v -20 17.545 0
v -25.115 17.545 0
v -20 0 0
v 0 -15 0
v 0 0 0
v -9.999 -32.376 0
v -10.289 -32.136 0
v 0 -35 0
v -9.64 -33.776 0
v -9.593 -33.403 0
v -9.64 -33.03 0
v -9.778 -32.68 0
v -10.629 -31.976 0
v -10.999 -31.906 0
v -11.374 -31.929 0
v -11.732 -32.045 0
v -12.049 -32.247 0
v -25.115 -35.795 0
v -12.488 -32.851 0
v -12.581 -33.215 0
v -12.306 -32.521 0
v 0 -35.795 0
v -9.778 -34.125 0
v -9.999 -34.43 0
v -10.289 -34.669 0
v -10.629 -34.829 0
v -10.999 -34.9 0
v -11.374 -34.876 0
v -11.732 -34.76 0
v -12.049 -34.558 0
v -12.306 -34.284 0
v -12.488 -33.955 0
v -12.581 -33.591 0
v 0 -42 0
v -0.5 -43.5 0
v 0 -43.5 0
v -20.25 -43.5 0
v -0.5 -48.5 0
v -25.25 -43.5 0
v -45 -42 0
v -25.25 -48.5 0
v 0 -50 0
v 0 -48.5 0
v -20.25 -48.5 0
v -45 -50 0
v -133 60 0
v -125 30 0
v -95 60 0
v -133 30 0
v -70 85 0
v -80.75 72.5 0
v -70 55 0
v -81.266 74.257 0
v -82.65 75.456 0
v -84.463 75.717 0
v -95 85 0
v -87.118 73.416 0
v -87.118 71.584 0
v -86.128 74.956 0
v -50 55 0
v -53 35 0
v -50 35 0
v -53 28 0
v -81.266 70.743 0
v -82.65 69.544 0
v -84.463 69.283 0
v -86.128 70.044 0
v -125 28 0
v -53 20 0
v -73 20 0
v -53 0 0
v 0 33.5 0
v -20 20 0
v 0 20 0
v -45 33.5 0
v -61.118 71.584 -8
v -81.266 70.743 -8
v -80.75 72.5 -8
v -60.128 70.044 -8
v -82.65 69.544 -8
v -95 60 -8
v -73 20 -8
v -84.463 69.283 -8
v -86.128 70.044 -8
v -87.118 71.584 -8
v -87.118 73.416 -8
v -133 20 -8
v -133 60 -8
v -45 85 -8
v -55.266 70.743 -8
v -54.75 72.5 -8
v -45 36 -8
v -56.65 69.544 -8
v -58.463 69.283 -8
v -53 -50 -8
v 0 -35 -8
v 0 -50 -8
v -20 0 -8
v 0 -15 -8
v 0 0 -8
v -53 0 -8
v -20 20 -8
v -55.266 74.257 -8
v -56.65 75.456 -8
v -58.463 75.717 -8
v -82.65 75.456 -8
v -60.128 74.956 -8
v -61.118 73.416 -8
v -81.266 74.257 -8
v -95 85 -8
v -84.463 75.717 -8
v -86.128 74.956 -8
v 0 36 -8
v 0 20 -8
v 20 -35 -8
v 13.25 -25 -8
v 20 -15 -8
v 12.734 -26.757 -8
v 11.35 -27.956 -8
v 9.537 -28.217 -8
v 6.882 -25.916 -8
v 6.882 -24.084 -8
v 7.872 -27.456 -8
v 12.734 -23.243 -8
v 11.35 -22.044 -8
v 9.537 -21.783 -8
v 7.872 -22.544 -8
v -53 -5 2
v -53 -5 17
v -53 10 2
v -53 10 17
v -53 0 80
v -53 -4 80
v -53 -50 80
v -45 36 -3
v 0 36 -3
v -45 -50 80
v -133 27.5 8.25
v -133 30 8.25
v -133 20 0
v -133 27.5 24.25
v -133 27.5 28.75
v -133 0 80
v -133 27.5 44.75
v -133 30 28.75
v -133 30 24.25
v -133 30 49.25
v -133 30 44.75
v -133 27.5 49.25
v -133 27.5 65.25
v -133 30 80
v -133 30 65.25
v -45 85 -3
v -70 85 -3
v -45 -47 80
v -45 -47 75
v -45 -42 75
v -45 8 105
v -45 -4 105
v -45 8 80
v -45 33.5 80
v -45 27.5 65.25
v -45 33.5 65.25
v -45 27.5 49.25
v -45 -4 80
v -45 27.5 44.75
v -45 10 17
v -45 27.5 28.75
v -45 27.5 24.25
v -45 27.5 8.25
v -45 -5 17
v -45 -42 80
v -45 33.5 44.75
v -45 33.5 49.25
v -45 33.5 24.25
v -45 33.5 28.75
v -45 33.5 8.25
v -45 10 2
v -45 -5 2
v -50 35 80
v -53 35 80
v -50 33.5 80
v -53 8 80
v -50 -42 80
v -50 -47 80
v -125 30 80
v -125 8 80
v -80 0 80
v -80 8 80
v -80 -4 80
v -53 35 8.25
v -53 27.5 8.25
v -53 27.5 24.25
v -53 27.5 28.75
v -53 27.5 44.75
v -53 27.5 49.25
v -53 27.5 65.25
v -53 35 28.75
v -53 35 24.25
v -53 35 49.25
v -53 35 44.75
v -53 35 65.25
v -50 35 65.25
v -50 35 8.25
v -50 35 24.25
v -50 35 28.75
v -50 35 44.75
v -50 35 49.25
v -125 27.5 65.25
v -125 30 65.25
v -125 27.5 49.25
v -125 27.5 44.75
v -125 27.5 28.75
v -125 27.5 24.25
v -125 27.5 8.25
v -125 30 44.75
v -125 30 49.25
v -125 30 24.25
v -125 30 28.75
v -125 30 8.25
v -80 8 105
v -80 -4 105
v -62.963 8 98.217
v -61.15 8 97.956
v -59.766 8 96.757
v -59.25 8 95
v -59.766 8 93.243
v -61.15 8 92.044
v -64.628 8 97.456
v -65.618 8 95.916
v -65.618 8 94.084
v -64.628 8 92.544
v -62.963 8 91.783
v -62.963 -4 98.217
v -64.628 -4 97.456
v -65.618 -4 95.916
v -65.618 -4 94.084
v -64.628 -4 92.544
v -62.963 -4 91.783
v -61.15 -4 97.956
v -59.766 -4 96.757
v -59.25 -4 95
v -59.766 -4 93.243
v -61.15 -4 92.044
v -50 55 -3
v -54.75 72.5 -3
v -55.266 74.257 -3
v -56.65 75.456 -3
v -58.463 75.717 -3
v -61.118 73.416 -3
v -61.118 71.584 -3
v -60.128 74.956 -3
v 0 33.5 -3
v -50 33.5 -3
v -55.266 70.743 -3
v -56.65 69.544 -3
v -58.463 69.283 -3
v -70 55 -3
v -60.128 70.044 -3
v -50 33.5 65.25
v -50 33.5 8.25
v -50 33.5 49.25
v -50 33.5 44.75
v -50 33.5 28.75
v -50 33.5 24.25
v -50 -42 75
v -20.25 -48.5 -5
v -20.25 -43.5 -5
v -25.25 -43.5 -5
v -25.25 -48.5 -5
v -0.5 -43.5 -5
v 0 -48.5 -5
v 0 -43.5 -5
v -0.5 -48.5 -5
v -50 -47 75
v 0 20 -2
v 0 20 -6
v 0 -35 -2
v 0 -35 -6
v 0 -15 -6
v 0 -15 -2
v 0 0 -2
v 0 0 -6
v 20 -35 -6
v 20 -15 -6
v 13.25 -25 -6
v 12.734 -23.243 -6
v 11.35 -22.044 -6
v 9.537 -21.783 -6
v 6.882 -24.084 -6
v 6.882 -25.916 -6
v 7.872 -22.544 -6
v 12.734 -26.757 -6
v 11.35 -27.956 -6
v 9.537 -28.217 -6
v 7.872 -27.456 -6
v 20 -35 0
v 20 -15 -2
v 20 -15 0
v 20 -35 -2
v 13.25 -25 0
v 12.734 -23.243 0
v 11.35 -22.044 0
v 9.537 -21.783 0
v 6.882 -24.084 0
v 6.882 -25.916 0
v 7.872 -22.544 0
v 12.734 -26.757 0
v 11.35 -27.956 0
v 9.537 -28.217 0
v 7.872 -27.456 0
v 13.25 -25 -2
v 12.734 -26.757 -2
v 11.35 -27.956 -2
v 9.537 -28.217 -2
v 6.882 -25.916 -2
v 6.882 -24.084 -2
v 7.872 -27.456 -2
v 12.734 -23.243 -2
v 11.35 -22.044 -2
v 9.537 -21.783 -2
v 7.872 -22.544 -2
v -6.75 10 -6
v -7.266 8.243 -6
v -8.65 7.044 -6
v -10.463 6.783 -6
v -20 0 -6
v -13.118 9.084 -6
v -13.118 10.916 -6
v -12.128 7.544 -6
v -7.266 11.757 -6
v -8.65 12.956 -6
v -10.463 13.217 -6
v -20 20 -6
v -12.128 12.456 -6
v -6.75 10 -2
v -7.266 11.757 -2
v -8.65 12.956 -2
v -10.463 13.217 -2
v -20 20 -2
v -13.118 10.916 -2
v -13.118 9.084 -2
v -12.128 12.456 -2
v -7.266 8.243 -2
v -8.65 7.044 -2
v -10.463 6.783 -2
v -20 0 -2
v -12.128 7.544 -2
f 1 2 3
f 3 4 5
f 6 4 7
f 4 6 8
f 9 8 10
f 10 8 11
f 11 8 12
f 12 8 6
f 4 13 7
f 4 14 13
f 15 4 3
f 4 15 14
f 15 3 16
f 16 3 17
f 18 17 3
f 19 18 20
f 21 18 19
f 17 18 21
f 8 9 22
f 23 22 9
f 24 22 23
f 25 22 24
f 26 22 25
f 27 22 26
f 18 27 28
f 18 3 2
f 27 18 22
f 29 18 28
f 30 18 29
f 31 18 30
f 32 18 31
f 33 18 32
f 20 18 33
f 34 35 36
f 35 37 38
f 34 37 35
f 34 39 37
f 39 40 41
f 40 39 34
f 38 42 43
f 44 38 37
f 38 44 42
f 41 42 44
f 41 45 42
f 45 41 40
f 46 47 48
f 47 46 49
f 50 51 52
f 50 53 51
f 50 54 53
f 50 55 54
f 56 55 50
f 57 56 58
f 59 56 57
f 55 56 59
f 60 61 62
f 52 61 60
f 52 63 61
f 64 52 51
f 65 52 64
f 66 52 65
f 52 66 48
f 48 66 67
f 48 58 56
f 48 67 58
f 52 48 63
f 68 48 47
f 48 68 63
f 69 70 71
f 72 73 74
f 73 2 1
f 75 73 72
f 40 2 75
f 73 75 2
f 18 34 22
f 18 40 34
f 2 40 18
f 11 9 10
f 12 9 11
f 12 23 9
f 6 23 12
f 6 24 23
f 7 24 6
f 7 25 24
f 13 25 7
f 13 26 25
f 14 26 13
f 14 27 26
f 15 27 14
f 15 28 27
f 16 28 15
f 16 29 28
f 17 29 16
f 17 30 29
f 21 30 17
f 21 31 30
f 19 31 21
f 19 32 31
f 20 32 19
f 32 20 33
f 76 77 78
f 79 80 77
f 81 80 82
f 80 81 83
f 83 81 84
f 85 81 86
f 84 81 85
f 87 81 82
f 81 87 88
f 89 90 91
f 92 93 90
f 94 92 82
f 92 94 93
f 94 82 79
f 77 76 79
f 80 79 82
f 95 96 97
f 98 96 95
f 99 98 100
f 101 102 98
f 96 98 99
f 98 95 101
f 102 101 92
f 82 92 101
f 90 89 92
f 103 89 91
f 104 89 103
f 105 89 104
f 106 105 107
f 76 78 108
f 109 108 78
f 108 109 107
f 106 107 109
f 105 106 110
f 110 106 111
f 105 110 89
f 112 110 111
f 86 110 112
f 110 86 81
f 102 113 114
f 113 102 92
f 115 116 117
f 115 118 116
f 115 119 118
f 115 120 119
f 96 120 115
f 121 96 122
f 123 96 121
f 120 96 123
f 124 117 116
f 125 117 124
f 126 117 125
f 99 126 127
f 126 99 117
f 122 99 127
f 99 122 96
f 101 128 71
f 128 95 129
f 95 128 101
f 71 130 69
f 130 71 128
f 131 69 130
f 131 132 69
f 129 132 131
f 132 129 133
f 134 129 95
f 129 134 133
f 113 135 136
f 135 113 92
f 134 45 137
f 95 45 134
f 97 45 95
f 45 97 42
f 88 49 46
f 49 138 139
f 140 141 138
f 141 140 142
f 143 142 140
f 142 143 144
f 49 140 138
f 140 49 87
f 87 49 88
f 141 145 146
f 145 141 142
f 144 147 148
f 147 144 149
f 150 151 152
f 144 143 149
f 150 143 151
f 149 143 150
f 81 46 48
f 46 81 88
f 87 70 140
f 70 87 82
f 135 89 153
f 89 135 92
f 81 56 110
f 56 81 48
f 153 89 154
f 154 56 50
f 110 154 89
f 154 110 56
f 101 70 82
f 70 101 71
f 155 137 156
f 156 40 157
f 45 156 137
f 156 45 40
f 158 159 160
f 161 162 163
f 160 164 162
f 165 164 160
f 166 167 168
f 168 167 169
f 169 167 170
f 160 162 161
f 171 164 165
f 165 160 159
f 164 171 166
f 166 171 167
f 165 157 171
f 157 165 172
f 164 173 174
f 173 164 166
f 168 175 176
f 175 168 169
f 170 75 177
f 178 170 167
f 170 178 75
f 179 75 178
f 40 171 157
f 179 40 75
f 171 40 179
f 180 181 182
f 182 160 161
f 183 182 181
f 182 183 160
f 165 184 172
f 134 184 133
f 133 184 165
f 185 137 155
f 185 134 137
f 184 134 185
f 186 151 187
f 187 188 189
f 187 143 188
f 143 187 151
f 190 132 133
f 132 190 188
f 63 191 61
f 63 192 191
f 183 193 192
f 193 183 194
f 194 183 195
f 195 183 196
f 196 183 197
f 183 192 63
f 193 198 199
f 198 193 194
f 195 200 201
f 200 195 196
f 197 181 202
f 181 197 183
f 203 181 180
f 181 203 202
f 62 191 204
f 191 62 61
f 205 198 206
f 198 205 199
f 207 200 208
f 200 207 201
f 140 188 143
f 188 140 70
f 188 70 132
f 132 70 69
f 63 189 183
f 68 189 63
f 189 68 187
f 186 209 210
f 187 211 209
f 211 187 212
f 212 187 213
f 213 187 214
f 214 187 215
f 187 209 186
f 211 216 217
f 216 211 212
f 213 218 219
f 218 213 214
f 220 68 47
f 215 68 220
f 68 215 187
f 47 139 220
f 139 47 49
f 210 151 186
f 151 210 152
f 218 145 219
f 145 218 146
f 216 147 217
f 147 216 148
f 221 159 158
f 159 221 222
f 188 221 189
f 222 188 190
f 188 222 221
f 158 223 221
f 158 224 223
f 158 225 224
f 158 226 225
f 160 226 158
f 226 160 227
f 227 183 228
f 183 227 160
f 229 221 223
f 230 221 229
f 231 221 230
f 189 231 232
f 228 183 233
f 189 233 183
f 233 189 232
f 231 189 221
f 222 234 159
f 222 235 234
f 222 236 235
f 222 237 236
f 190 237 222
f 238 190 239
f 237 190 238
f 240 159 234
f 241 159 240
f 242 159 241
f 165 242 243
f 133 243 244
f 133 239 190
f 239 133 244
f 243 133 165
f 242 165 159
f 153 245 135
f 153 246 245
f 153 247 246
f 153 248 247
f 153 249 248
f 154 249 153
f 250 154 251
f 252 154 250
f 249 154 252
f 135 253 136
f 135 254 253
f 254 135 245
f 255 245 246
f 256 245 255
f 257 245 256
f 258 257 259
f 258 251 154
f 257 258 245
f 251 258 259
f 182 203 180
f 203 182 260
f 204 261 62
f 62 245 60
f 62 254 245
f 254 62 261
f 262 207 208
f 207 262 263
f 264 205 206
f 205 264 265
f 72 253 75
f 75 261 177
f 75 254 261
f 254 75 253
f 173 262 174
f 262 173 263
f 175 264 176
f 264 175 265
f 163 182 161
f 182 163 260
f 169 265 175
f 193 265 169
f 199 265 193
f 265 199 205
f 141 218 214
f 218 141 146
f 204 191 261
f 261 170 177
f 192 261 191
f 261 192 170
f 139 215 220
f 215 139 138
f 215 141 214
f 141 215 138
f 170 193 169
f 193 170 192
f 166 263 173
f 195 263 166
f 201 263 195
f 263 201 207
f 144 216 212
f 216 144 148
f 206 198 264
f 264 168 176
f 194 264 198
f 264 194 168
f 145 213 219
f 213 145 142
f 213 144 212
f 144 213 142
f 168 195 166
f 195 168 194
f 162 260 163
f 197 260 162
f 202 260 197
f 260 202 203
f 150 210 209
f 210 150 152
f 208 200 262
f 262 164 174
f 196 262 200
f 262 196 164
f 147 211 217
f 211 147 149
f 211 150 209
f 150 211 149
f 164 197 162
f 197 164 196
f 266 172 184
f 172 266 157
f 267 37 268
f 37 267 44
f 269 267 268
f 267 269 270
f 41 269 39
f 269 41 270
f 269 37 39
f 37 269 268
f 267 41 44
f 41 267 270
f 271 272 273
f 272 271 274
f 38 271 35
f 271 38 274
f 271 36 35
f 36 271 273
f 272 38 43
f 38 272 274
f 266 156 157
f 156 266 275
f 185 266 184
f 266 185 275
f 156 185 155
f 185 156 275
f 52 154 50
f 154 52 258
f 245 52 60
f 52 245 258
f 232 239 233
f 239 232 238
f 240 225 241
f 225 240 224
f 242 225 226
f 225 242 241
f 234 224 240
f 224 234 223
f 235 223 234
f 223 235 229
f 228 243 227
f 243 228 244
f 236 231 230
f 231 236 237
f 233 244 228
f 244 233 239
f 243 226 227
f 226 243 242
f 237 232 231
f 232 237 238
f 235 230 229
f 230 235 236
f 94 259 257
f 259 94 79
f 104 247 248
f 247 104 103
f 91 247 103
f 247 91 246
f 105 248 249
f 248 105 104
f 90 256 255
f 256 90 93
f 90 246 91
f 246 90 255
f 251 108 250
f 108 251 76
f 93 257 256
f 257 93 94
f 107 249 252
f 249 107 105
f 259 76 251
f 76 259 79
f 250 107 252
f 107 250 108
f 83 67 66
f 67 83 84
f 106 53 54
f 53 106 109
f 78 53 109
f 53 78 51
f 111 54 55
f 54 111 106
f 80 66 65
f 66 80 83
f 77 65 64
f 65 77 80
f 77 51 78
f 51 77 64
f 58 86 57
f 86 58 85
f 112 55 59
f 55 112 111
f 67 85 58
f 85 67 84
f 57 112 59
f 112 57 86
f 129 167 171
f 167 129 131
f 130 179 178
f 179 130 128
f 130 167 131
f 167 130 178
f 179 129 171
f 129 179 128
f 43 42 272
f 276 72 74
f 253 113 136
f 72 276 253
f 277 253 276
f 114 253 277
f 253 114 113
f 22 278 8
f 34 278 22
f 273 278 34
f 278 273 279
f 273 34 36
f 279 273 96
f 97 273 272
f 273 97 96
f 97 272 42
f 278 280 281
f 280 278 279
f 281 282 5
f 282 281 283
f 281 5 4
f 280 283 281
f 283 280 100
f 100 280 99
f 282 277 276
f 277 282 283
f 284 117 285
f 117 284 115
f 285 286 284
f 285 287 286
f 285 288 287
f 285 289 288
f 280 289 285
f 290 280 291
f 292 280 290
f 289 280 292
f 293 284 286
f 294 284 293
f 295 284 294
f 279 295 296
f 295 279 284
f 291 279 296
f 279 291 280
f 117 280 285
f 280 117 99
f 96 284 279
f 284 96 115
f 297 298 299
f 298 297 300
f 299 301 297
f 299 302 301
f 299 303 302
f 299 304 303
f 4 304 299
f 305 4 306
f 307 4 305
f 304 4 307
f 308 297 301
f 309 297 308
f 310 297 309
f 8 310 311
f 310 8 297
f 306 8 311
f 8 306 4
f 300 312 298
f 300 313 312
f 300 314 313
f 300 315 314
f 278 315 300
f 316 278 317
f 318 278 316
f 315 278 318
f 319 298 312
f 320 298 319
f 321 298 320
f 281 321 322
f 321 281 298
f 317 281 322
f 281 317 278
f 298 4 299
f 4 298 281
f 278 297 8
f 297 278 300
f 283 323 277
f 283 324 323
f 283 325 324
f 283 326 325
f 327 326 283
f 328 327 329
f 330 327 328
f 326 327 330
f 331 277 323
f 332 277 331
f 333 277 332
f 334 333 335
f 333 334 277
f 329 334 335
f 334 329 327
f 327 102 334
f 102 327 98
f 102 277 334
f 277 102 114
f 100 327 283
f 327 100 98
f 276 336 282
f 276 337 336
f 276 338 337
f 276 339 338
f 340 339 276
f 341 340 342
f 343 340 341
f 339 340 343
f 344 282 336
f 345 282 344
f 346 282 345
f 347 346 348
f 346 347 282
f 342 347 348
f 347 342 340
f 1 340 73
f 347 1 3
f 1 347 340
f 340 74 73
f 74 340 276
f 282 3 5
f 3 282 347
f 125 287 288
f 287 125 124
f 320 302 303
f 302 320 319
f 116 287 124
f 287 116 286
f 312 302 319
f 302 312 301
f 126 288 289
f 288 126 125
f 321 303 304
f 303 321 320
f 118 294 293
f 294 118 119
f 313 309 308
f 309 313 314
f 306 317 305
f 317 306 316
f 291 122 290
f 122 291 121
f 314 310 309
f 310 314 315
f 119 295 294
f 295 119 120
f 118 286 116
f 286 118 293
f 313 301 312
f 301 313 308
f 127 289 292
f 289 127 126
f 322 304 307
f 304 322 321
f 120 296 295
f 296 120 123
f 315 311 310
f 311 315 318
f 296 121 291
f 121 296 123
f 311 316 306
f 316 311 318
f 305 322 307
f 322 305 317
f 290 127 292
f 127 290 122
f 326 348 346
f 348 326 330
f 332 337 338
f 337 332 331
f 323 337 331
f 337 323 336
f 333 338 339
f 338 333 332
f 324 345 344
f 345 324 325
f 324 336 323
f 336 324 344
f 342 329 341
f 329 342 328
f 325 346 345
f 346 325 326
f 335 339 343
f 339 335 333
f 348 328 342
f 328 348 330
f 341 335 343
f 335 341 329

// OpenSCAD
//
//
//accessories = "OFF";
//mode = "PARTS";
//
//
//if (accessories=="ON"){
//	color([222/255,184/255,135/255]) translate([-50,33.5,-3]) board();
//	translate([-10,15,0]) Arduino(0,0,0);
//} 
//if (mode=="EXPLODED"){
//	baseWCuts();
//	translate([-45,-80,30]) backDoor();
//	translate([0,30,30]) frontPanel();
//	translate([0,30,30]) mirror([1,0,0]) frontPanel();
//}
//if (mode=="ASSEMBLED"){
//	baseWCuts();
//	translate([-45,-50,0]) backDoor();
//	frontPanel();
//	mirror([1,0,0]) frontPanel();
//}
//if (mode=="PARTS"){
//	baseWCuts();
//	translate([280,-10,40]) rotate([270,0,0]) frontPanel();
//	translate([-250,0,10]) rotate([270,0,0]) backDoor();
//	translate([230,-10,40]) mirror([1,0,0]) rotate([270,0,0]) frontPanel();
//
//}




///////////////////////////////
/* MAIN CONSTRUCTOR MODULES */
//////////////////////////////
baseLeftConnect();

module baseLeftConnect(){
	difference(){
	union(){
		baseLeft();
		translate([0,-35,-8]) cube([20,20,2]);
		translate([0,-35,-2]) cube([20,20,2]);
	}
	translate([-20,0,-8]) cube([20,20,2]);
	translate([-20,0,-2]) cube([20,20,2]);
	translate([10,-25,-8]) cylinder(r=3.25,h=8);
	translate([-10,10,-8]) cylinder(r=3.25,h=8);	
	}
}

module baseRight(){
	difference(){	
		baseWCuts();
		translate([-300,-150,-10]) cube([300,300,300]);
	}
}

module baseRightConnect(){
	difference(){
	union(){
		baseRight();
		translate([-20,0,-8]) cube([20,20,2]);
		translate([-20,0,-2]) cube([20,20,2]);
	}
	translate([0,-35,-8]) cube([20,20,2]);
	translate([0,-35,-2]) cube([20,20,2]);
	translate([10,-25,-8]) cylinder(r=3.25,h=8);
	translate([-10,10,-8]) cylinder(r=3.25,h=8);	
	}
}

module baseLeft(){
	difference(){	
		baseWCuts();
		translate([0,-150,-10]) cube([300,300,300]);
	}
}

//Creates exact front panel with cuts using frontPanelBasic()
module frontPanel(){ 
	difference(){
		translate([-126.5,52,0]) frontPanelBasic();
		baseWCuts();
		translate([-50,33.5,-3]) board();
		translate([65,10,95]) rotate([90,0,0]) cylinder(r=6.5,h=20);
		translate([-58,72.5,-10]) cylinder(r=3.25,h=20);//cuts panel screw holes
		translate([-84,72.5,-10]) cylinder(r=3.25,h=20);
	}
}

//Creates basic block front panel without cuts
module frontPanelBasic(){ 
	union(){
		cube([81.5,8,80]);
		translate([31.5,0,-3]) cube([50,33,8]);
		translate([73.5,-20,-5]) cube([8,20,85]);
		translate([-6.5,-23,0]) cube([8,31,80]);
	}
}

//Creates full base with sides, floor, and all necessary cuts
module baseWCuts(){
	difference(){
		base();
		translate([-50,33.5,-3]) board(); //cuts board
		translate([-10,15,0]) Arduino(0,0,0); //cuts arduino
		translate([-45,-50,0]) backDoor(); //cuts back door
		translate([-70,55,-3]) cube([140,30,3]); //cuts indent in prongs
		translate([-62.5,10,95]) rotate([90,0,0]) cylinder(r=3.25,h=20); //cuts hanger
		translate([62.5,10,95]) rotate([90,0,0]) cylinder(r=3.25,h=20);
		translate([-58,72.5,-10]) cylinder(r=3.25,h=20);//cuts panel screw holes
		translate([-84,72.5,-10]) cylinder(r=3.25,h=20);
		translate([58,72.5,-10]) cylinder(r=3.25,h=20);
		translate([84,72.5,-10]) cylinder(r=3.25,h=20);
		translate([-53,-5,2]) cube([15,15,15]); //cuts arduino extension port
		translate([-50,36.5,-3]) cube([100,20,3]);
	}
}

//Creates simple base with floor and sides
module base(){
	union(){
		translate([-53,-50,-8]) floor();
		translate([-53,-50,0]) sides();
		translate([-80,-4,80]) cube([35,12,25]); //creates top hinges 
		translate([45,-4,80]) cube([35,12,25]);
	}
}

//Creates back door that will fit into slots in the base.
module backDoor(){
	union(){
		cube([90,8,80]);
	
		translate([19.75,1.5,-5]) cube([5,5,5]); //bottom notches
		translate([44.5,1.5,-5]) cube([5,5,5]);
		translate([69.25,1.5,-5]) cube([5,5,5]);
	
		translate([-5,3,75]) cube([5,5,5]);//top notches
		translate([90,3,75]) cube([5,5,5]);
	
		translate([23,0,40]) rotate([90,0,0]) scale([1,1,1.5]) drawtext("metaLab."); //text
	}
}

//Creates walls including slants
module sides(){

	cube([8,85,80]);
	translate([98,0,0]) cube([8,85,80]);
	translate([-80,70,0]) slant();
	translate([186,70,0]) mirror([1,0,0]) slant();

}

//creates slanted L shaped wall
module slant(){
	polyhedron(
	points = [ [0,0,0],[80,0,0],[0,10,0],[8,10,0],[8,8,0], [80,8,0],
				[0,-20,80],[80,-20,80],[0,10,80],[8,10,80],[8,-12,80],
				[80,-12,80] ],

	faces = [ [0,1,5,4,3,2] ,[6,8,9,10,11,7], [2,8,6,0],
				[0,6,7,1], [1,7,11,5], [5,11,10,4], [4,10,9,3],
				[3,9,8,2]]


	);
}

//Creates floor of the enclosure
module floor(){
	union(){
		cube([106,86,8]);
		
		translate([-80,70,0]) cube([80,40,8]);//wings
		translate([106,70,0]) cube([80,40,8]);
	
		translate([-42,85,0]) cube([50,50,8]); //prongs
		translate([98,85,0]) cube([50,50,8]);
		diagonal();
		translate([106,0,0]) mirror([1,0,0]) diagonal();
	}
}

//Creates triangle inlet for floor
module diagonal(){
	polyhedron(
		points = [ [0,50,0],[0,70,0],[-20,70,0],[0,50,8],[0,70,8],[-20,70,8]],
		faces = [ [2,1,0],[3,4,5],[2,0,3,5],[0,1,4,3],[1,2,5,4] ]
	);
}

//Models enclosed circuit board
module board(){
	union(){
		cube([100,3,85]);
		translate([-87.5,-6,11.25]) cube([95,16,16]);//left
		translate([-87.5,-6,31.75]) cube([95,16,16]);
		translate([-87.5,-6,52.25]) cube([95,16,16]);
	
		translate([92.5,-6,11.25]) cube([95,16,16]);//right
		translate([92.5,-6,31.75]) cube([95,16,16]);
		translate([92.5,-6,52.25]) cube([95,16,16]);
	}
}

/////////////////////////
//TEXT DRAWING MODULES//
////////////////////////
//You can ignore these//

module drawtext(text) {
	//Characters
	chars = " !\"#$%&'()*+,-./0123456789:;<=>?@ABCDEFGHIJKLMNOPQRSTUVWXYZ[\\]^_`abcdefghijklmnopqrstuvwxyz{|}";

	//Chracter table defining 5x7 characters
	//Adapted from: http://www.geocities.com/dinceraydin/djlcdsim/chartable.js
	char_table = [ [ 0, 0, 0, 0, 0, 0, 0],
                  [ 4, 0, 4, 4, 4, 4, 4],
                  [ 0, 0, 0, 0,10,10,10],
                  [10,10,31,10,31,10,10],
                  [ 4,30, 5,14,20,15, 4],
                  [ 3,19, 8, 4, 2,25,24],
                  [13,18,21, 8,20,18,12],
                  [ 0, 0, 0, 0, 8, 4,12],
                  [ 2, 4, 8, 8, 8, 4, 2],
                  [ 8, 4, 2, 2, 2, 4, 8],
                  [ 0, 4,21,14,21, 4, 0],
                  [ 0, 4, 4,31, 4, 4, 0],
                  [ 8, 4,12, 0, 0, 0, 0],
                  [ 0, 0, 0,31, 0, 0, 0],
                  [12,12, 0, 0, 0, 0, 0],
                  [ 0,16, 8, 4, 2, 1, 0],
                  [14,17,25,21,19,17,14],
                  [14, 4, 4, 4, 4,12, 4],
                  [31, 8, 4, 2, 1,17,14],
                  [14,17, 1, 2, 4, 2,31],
                  [ 2, 2,31,18,10, 6, 2],
                  [14,17, 1, 1,30,16,31],
                  [14,17,17,30,16, 8, 6],
                  [ 8, 8, 8, 4, 2, 1,31],
                  [14,17,17,14,17,17,14],
                  [12, 2, 1,15,17,17,14],
                  [ 0,12,12, 0,12,12, 0],
                  [ 8, 4,12, 0,12,12, 0],
                  [ 2, 4, 8,16, 8, 4, 2],
                  [ 0, 0,31, 0,31, 0, 0],
                  [16, 8, 4, 2, 4, 8,16],
                  [ 4, 0, 4, 2, 1,17,14],
                  [14,21,21,13, 1,17,14],
                  [17,17,31,17,17,17,14],
                  [30,17,17,30,17,17,30],
                  [14,17,16,16,16,17,14],
                  [30,17,17,17,17,17,30],
                  [31,16,16,30,16,16,31],
                  [16,16,16,30,16,16,31],
                  [15,17,17,23,16,17,14],
                  [17,17,17,31,17,17,17],
                  [14, 4, 4, 4, 4, 4,14],
                  [12,18, 2, 2, 2, 2, 7],
                  [17,18,20,24,20,18,17],
                  [31,16,16,16,16,16,16],
                  [17,17,17,21,21,27,17],
                  [17,17,19,21,25,17,17],
                  [14,17,17,17,17,17,14],
                  [16,16,16,30,17,17,30],
                  [13,18,21,17,17,17,14],
                  [17,18,20,30,17,17,30],
                  [30, 1, 1,14,16,16,15],
                  [ 4, 4, 4, 4, 4, 4,31],
                  [14,17,17,17,17,17,17],
                  [ 4,10,17,17,17,17,17],
                  [10,21,21,21,17,17,17],
                  [17,17,10, 4,10,17,17],
                  [ 4, 4, 4,10,17,17,17],
                  [31,16, 8, 4, 2, 1,31],
                  [14, 8, 8, 8, 8, 8,14],
                  [ 0, 1, 2, 4, 8,16, 0],
                  [14, 2, 2, 2, 2, 2,14],
                  [ 0, 0, 0, 0,17,10, 4],
                  [31, 0, 0, 0, 0, 0, 0],
                  [ 0, 0, 0, 0, 2, 4, 8],
                  [15,17,15, 1,14, 0, 0],
                  [30,17,17,25,22,16,16],
                  [14,17,16,16,14, 0, 0],
                  [15,17,17,19,13, 1, 1],
                  [14,16,31,17,14, 0, 0],
                  [ 8, 8, 8,28, 8, 9, 6],
                  [14, 1,15,17,15, 0, 0],
                  [17,17,17,25,22,16,16],
                  [14, 4, 4, 4,12, 0, 4],
                  [12,18, 2, 2, 2, 6, 2],
                  [18,20,24,20,18,16,16],
                  [14, 4, 4, 4, 4, 4,12],
                  [17,17,21,21,26, 0, 0],
                  [17,17,17,25,22, 0, 0],
                  [14,17,17,17,14, 0, 0],
                  [16,16,30,17,30, 0, 0],
                  [ 1, 1,15,19,13, 0, 0],
                  [16,16,16,25,22, 0, 0],
                  [30, 1,14,16,15, 0, 0],
                  [ 6, 9, 8, 8,28, 8, 8],
                  [13,19,17,17,17, 0, 0],
                  [ 4,10,17,17,17, 0, 0],
                  [10,21,21,17,17, 0, 0],
                  [17,10, 4,10,17, 0, 0],
                  [14, 1,15,17,17, 0, 0],
                  [31, 8, 4, 2,31, 0, 0],
                  [ 2, 4, 4, 8, 4, 4, 2],
                  [ 4, 4, 4, 4, 4, 4, 4],
                  [ 8, 4, 4, 2, 4, 4, 8] ];

	//Binary decode table
	dec_table = [ "00000", "00001", "00010", "00011", "00100", "00101",
  	            "00110", "00111", "01000", "01001", "01010", "01011",
  	            "01100", "01101", "01110", "01111", "10000", "10001",
  	            "10010", "10011", "10100", "10101", "10110", "10111",
	            "11000", "11001", "11010", "11011", "11100", "11101",
	            "11110", "11111" ];

	//Process string one character at a time
	for(itext = [0:len(text)-1]) {
		//Convert character to index
		assign(ichar = search(text[itext],chars,1)[0]) {
			//Decode character - rows
			for(irow = [0:6]) {
				assign(val = dec_table[char_table[ichar][irow]]) {
					//Decode character - cols
					for(icol = [0:4]) {
						assign(bit = search(val[icol],"01",1)[0]) {
							if(bit) {
								//Output cube
								translate([icol + (6*itext), irow, 0])
									cube([1.0001,1.0001,1]);
							}
						}
					}
				}
			}
		}
	}
}


////////////////////////////
//ARDUINO DRAWING MODULES//
///////////////////////////
//You can ignore these//

board_height = 4;

module Arduino(solid_holes, combined_headers, extend_ports)
{
	echo(str("solid_holes: ", solid_holes));
	echo(str("combined_headers: ", combined_headers));
	echo(str("extend_ports: ", extend_ports));

	if (solid_holes == 1)
	{
		echo("solid holes");
		union()
		{
			Board();
			USB(extend_ports);
			PowerPlug(extend_ports);
			FemaleHeaders(combined_headers);
			MaleHeaders();
			ResetButton();
			ATMega();
			MountingHoles();
		}
	}
	else
	{
		echo("regular holes");
		difference()
		{
			union()
			{
				Board();
				USB(extend_ports);
				PowerPlug(extend_ports);
				FemaleHeaders(combined_headers);
				MaleHeaders();
				ResetButton();
				ATMega();
			}
			MountingHoles();
		}
	}
}

module ResetButton()
{
	translate([39, -26, board_height])
	{
		color([0.8, 0.8, 0.8])
		cube([6, 6, 2.2]);
		
		color([0.6, 0.4, 0.2])
		translate([3, 3, 0]) cylinder(r=1.4, h=3.5, $fn=25);
	}
}

module MaleHeaders()
{
	color([0.6, 0.6, 0.6])
	translate([0, 0, board_height])
	{
		translate([0, -7, 0]) cube([7, 5, 9.2]);
		translate([47.5, -26, 0]) cube([5, 7, 9.2]);
	}
}

module ATMega()
{
	color([0.3, 0.3, 0.3])
	translate([14, -39, board_height])
	{
		cube([35.5, 10, 7.5]);
	}
}

module FemaleHeaders(combined)
{
	color([0.3, 0.3, 0.3])
	translate([0, 0, board_height])
	{
		translate([0, -1, 0])
		{
			translate([7, 0, 0])
			{
				if(combined == 1)
				{
					cube([43, 2, 8.2]);
				}
				else
				{
					cube([21, 2, 8.2]);
					translate([22, 0, 0]) cube([21, 2, 8.2]);
				}
			}
		}

		translate([0, -50, 0])
		{
			translate([17, 0, 0])
			{
				if(combined == 1)
				{
					cube([33, 2, 8.2]);
				}
				else
				{
					cube([15.5, 2, 8.2]);
					translate([17.5, 0, 0]) cube([15.5, 2, 8.2]);
				}
			}
		}
	}
}

module PowerPlug(extended)
{
	if(extended == 1)
	{
		translate([-26.893, -47.4929962, board_height])
		color([0.3, 0.3, 0.3])
		cube([24, 9, 11]);
	}
	else
	{
		translate([-16.893, -47.4929962, board_height])
		color([0.3, 0.3, 0.3])
		cube([14, 9, 11]);
	}
}

module USB(extended)
{
	if(extended == 1)
	{
		translate([-31.465, -18.5623962, board_height])
		color([0.8, 0.8, 0.8])
		cube([26, 12, 11]);
	}
	else
	{
		translate([-61.465, -18.5623962, board_height])
		color([0.8, 0.8, 0.8])
		cube([56, 12, 11]);
	}
}


module Board()
{
	color([0, 0.6, 0.8])
	linear_extrude(height = board_height, convexity = 10, twist = 0)
	{
		polygon( points = [ [-15.115, 2.545],
						[49.4, 2.545],
						[50.925, 1.021],
						[50.925, -10.409],
						[53.465, -12.949],
						[53.465, -45.715],
						[50.925, -48.255],
						[50.925, -50.795],
						[-15.115, -50.795] ],
				paths = [[0, 1, 2, 3, 4, 5, 6, 7, 8]],
				convexity = 10);
	}
}

module MountingHoles()
{
	translate([0, 0, -10])
	{
		ArduinoHole(25);
		translate([-1.0929112, -48.4026972, 0]) ArduinoHole(25);
		translate([51, -15.25, 0]) ArduinoHole(25);
		translate([51, -43.25, 0]) ArduinoHole(25);
	}
}

module ArduinoHole(length)
{
	color([0.7, 0.7, 0.7])
	cylinder(r=1.5, h=length, $fn=25);
}
